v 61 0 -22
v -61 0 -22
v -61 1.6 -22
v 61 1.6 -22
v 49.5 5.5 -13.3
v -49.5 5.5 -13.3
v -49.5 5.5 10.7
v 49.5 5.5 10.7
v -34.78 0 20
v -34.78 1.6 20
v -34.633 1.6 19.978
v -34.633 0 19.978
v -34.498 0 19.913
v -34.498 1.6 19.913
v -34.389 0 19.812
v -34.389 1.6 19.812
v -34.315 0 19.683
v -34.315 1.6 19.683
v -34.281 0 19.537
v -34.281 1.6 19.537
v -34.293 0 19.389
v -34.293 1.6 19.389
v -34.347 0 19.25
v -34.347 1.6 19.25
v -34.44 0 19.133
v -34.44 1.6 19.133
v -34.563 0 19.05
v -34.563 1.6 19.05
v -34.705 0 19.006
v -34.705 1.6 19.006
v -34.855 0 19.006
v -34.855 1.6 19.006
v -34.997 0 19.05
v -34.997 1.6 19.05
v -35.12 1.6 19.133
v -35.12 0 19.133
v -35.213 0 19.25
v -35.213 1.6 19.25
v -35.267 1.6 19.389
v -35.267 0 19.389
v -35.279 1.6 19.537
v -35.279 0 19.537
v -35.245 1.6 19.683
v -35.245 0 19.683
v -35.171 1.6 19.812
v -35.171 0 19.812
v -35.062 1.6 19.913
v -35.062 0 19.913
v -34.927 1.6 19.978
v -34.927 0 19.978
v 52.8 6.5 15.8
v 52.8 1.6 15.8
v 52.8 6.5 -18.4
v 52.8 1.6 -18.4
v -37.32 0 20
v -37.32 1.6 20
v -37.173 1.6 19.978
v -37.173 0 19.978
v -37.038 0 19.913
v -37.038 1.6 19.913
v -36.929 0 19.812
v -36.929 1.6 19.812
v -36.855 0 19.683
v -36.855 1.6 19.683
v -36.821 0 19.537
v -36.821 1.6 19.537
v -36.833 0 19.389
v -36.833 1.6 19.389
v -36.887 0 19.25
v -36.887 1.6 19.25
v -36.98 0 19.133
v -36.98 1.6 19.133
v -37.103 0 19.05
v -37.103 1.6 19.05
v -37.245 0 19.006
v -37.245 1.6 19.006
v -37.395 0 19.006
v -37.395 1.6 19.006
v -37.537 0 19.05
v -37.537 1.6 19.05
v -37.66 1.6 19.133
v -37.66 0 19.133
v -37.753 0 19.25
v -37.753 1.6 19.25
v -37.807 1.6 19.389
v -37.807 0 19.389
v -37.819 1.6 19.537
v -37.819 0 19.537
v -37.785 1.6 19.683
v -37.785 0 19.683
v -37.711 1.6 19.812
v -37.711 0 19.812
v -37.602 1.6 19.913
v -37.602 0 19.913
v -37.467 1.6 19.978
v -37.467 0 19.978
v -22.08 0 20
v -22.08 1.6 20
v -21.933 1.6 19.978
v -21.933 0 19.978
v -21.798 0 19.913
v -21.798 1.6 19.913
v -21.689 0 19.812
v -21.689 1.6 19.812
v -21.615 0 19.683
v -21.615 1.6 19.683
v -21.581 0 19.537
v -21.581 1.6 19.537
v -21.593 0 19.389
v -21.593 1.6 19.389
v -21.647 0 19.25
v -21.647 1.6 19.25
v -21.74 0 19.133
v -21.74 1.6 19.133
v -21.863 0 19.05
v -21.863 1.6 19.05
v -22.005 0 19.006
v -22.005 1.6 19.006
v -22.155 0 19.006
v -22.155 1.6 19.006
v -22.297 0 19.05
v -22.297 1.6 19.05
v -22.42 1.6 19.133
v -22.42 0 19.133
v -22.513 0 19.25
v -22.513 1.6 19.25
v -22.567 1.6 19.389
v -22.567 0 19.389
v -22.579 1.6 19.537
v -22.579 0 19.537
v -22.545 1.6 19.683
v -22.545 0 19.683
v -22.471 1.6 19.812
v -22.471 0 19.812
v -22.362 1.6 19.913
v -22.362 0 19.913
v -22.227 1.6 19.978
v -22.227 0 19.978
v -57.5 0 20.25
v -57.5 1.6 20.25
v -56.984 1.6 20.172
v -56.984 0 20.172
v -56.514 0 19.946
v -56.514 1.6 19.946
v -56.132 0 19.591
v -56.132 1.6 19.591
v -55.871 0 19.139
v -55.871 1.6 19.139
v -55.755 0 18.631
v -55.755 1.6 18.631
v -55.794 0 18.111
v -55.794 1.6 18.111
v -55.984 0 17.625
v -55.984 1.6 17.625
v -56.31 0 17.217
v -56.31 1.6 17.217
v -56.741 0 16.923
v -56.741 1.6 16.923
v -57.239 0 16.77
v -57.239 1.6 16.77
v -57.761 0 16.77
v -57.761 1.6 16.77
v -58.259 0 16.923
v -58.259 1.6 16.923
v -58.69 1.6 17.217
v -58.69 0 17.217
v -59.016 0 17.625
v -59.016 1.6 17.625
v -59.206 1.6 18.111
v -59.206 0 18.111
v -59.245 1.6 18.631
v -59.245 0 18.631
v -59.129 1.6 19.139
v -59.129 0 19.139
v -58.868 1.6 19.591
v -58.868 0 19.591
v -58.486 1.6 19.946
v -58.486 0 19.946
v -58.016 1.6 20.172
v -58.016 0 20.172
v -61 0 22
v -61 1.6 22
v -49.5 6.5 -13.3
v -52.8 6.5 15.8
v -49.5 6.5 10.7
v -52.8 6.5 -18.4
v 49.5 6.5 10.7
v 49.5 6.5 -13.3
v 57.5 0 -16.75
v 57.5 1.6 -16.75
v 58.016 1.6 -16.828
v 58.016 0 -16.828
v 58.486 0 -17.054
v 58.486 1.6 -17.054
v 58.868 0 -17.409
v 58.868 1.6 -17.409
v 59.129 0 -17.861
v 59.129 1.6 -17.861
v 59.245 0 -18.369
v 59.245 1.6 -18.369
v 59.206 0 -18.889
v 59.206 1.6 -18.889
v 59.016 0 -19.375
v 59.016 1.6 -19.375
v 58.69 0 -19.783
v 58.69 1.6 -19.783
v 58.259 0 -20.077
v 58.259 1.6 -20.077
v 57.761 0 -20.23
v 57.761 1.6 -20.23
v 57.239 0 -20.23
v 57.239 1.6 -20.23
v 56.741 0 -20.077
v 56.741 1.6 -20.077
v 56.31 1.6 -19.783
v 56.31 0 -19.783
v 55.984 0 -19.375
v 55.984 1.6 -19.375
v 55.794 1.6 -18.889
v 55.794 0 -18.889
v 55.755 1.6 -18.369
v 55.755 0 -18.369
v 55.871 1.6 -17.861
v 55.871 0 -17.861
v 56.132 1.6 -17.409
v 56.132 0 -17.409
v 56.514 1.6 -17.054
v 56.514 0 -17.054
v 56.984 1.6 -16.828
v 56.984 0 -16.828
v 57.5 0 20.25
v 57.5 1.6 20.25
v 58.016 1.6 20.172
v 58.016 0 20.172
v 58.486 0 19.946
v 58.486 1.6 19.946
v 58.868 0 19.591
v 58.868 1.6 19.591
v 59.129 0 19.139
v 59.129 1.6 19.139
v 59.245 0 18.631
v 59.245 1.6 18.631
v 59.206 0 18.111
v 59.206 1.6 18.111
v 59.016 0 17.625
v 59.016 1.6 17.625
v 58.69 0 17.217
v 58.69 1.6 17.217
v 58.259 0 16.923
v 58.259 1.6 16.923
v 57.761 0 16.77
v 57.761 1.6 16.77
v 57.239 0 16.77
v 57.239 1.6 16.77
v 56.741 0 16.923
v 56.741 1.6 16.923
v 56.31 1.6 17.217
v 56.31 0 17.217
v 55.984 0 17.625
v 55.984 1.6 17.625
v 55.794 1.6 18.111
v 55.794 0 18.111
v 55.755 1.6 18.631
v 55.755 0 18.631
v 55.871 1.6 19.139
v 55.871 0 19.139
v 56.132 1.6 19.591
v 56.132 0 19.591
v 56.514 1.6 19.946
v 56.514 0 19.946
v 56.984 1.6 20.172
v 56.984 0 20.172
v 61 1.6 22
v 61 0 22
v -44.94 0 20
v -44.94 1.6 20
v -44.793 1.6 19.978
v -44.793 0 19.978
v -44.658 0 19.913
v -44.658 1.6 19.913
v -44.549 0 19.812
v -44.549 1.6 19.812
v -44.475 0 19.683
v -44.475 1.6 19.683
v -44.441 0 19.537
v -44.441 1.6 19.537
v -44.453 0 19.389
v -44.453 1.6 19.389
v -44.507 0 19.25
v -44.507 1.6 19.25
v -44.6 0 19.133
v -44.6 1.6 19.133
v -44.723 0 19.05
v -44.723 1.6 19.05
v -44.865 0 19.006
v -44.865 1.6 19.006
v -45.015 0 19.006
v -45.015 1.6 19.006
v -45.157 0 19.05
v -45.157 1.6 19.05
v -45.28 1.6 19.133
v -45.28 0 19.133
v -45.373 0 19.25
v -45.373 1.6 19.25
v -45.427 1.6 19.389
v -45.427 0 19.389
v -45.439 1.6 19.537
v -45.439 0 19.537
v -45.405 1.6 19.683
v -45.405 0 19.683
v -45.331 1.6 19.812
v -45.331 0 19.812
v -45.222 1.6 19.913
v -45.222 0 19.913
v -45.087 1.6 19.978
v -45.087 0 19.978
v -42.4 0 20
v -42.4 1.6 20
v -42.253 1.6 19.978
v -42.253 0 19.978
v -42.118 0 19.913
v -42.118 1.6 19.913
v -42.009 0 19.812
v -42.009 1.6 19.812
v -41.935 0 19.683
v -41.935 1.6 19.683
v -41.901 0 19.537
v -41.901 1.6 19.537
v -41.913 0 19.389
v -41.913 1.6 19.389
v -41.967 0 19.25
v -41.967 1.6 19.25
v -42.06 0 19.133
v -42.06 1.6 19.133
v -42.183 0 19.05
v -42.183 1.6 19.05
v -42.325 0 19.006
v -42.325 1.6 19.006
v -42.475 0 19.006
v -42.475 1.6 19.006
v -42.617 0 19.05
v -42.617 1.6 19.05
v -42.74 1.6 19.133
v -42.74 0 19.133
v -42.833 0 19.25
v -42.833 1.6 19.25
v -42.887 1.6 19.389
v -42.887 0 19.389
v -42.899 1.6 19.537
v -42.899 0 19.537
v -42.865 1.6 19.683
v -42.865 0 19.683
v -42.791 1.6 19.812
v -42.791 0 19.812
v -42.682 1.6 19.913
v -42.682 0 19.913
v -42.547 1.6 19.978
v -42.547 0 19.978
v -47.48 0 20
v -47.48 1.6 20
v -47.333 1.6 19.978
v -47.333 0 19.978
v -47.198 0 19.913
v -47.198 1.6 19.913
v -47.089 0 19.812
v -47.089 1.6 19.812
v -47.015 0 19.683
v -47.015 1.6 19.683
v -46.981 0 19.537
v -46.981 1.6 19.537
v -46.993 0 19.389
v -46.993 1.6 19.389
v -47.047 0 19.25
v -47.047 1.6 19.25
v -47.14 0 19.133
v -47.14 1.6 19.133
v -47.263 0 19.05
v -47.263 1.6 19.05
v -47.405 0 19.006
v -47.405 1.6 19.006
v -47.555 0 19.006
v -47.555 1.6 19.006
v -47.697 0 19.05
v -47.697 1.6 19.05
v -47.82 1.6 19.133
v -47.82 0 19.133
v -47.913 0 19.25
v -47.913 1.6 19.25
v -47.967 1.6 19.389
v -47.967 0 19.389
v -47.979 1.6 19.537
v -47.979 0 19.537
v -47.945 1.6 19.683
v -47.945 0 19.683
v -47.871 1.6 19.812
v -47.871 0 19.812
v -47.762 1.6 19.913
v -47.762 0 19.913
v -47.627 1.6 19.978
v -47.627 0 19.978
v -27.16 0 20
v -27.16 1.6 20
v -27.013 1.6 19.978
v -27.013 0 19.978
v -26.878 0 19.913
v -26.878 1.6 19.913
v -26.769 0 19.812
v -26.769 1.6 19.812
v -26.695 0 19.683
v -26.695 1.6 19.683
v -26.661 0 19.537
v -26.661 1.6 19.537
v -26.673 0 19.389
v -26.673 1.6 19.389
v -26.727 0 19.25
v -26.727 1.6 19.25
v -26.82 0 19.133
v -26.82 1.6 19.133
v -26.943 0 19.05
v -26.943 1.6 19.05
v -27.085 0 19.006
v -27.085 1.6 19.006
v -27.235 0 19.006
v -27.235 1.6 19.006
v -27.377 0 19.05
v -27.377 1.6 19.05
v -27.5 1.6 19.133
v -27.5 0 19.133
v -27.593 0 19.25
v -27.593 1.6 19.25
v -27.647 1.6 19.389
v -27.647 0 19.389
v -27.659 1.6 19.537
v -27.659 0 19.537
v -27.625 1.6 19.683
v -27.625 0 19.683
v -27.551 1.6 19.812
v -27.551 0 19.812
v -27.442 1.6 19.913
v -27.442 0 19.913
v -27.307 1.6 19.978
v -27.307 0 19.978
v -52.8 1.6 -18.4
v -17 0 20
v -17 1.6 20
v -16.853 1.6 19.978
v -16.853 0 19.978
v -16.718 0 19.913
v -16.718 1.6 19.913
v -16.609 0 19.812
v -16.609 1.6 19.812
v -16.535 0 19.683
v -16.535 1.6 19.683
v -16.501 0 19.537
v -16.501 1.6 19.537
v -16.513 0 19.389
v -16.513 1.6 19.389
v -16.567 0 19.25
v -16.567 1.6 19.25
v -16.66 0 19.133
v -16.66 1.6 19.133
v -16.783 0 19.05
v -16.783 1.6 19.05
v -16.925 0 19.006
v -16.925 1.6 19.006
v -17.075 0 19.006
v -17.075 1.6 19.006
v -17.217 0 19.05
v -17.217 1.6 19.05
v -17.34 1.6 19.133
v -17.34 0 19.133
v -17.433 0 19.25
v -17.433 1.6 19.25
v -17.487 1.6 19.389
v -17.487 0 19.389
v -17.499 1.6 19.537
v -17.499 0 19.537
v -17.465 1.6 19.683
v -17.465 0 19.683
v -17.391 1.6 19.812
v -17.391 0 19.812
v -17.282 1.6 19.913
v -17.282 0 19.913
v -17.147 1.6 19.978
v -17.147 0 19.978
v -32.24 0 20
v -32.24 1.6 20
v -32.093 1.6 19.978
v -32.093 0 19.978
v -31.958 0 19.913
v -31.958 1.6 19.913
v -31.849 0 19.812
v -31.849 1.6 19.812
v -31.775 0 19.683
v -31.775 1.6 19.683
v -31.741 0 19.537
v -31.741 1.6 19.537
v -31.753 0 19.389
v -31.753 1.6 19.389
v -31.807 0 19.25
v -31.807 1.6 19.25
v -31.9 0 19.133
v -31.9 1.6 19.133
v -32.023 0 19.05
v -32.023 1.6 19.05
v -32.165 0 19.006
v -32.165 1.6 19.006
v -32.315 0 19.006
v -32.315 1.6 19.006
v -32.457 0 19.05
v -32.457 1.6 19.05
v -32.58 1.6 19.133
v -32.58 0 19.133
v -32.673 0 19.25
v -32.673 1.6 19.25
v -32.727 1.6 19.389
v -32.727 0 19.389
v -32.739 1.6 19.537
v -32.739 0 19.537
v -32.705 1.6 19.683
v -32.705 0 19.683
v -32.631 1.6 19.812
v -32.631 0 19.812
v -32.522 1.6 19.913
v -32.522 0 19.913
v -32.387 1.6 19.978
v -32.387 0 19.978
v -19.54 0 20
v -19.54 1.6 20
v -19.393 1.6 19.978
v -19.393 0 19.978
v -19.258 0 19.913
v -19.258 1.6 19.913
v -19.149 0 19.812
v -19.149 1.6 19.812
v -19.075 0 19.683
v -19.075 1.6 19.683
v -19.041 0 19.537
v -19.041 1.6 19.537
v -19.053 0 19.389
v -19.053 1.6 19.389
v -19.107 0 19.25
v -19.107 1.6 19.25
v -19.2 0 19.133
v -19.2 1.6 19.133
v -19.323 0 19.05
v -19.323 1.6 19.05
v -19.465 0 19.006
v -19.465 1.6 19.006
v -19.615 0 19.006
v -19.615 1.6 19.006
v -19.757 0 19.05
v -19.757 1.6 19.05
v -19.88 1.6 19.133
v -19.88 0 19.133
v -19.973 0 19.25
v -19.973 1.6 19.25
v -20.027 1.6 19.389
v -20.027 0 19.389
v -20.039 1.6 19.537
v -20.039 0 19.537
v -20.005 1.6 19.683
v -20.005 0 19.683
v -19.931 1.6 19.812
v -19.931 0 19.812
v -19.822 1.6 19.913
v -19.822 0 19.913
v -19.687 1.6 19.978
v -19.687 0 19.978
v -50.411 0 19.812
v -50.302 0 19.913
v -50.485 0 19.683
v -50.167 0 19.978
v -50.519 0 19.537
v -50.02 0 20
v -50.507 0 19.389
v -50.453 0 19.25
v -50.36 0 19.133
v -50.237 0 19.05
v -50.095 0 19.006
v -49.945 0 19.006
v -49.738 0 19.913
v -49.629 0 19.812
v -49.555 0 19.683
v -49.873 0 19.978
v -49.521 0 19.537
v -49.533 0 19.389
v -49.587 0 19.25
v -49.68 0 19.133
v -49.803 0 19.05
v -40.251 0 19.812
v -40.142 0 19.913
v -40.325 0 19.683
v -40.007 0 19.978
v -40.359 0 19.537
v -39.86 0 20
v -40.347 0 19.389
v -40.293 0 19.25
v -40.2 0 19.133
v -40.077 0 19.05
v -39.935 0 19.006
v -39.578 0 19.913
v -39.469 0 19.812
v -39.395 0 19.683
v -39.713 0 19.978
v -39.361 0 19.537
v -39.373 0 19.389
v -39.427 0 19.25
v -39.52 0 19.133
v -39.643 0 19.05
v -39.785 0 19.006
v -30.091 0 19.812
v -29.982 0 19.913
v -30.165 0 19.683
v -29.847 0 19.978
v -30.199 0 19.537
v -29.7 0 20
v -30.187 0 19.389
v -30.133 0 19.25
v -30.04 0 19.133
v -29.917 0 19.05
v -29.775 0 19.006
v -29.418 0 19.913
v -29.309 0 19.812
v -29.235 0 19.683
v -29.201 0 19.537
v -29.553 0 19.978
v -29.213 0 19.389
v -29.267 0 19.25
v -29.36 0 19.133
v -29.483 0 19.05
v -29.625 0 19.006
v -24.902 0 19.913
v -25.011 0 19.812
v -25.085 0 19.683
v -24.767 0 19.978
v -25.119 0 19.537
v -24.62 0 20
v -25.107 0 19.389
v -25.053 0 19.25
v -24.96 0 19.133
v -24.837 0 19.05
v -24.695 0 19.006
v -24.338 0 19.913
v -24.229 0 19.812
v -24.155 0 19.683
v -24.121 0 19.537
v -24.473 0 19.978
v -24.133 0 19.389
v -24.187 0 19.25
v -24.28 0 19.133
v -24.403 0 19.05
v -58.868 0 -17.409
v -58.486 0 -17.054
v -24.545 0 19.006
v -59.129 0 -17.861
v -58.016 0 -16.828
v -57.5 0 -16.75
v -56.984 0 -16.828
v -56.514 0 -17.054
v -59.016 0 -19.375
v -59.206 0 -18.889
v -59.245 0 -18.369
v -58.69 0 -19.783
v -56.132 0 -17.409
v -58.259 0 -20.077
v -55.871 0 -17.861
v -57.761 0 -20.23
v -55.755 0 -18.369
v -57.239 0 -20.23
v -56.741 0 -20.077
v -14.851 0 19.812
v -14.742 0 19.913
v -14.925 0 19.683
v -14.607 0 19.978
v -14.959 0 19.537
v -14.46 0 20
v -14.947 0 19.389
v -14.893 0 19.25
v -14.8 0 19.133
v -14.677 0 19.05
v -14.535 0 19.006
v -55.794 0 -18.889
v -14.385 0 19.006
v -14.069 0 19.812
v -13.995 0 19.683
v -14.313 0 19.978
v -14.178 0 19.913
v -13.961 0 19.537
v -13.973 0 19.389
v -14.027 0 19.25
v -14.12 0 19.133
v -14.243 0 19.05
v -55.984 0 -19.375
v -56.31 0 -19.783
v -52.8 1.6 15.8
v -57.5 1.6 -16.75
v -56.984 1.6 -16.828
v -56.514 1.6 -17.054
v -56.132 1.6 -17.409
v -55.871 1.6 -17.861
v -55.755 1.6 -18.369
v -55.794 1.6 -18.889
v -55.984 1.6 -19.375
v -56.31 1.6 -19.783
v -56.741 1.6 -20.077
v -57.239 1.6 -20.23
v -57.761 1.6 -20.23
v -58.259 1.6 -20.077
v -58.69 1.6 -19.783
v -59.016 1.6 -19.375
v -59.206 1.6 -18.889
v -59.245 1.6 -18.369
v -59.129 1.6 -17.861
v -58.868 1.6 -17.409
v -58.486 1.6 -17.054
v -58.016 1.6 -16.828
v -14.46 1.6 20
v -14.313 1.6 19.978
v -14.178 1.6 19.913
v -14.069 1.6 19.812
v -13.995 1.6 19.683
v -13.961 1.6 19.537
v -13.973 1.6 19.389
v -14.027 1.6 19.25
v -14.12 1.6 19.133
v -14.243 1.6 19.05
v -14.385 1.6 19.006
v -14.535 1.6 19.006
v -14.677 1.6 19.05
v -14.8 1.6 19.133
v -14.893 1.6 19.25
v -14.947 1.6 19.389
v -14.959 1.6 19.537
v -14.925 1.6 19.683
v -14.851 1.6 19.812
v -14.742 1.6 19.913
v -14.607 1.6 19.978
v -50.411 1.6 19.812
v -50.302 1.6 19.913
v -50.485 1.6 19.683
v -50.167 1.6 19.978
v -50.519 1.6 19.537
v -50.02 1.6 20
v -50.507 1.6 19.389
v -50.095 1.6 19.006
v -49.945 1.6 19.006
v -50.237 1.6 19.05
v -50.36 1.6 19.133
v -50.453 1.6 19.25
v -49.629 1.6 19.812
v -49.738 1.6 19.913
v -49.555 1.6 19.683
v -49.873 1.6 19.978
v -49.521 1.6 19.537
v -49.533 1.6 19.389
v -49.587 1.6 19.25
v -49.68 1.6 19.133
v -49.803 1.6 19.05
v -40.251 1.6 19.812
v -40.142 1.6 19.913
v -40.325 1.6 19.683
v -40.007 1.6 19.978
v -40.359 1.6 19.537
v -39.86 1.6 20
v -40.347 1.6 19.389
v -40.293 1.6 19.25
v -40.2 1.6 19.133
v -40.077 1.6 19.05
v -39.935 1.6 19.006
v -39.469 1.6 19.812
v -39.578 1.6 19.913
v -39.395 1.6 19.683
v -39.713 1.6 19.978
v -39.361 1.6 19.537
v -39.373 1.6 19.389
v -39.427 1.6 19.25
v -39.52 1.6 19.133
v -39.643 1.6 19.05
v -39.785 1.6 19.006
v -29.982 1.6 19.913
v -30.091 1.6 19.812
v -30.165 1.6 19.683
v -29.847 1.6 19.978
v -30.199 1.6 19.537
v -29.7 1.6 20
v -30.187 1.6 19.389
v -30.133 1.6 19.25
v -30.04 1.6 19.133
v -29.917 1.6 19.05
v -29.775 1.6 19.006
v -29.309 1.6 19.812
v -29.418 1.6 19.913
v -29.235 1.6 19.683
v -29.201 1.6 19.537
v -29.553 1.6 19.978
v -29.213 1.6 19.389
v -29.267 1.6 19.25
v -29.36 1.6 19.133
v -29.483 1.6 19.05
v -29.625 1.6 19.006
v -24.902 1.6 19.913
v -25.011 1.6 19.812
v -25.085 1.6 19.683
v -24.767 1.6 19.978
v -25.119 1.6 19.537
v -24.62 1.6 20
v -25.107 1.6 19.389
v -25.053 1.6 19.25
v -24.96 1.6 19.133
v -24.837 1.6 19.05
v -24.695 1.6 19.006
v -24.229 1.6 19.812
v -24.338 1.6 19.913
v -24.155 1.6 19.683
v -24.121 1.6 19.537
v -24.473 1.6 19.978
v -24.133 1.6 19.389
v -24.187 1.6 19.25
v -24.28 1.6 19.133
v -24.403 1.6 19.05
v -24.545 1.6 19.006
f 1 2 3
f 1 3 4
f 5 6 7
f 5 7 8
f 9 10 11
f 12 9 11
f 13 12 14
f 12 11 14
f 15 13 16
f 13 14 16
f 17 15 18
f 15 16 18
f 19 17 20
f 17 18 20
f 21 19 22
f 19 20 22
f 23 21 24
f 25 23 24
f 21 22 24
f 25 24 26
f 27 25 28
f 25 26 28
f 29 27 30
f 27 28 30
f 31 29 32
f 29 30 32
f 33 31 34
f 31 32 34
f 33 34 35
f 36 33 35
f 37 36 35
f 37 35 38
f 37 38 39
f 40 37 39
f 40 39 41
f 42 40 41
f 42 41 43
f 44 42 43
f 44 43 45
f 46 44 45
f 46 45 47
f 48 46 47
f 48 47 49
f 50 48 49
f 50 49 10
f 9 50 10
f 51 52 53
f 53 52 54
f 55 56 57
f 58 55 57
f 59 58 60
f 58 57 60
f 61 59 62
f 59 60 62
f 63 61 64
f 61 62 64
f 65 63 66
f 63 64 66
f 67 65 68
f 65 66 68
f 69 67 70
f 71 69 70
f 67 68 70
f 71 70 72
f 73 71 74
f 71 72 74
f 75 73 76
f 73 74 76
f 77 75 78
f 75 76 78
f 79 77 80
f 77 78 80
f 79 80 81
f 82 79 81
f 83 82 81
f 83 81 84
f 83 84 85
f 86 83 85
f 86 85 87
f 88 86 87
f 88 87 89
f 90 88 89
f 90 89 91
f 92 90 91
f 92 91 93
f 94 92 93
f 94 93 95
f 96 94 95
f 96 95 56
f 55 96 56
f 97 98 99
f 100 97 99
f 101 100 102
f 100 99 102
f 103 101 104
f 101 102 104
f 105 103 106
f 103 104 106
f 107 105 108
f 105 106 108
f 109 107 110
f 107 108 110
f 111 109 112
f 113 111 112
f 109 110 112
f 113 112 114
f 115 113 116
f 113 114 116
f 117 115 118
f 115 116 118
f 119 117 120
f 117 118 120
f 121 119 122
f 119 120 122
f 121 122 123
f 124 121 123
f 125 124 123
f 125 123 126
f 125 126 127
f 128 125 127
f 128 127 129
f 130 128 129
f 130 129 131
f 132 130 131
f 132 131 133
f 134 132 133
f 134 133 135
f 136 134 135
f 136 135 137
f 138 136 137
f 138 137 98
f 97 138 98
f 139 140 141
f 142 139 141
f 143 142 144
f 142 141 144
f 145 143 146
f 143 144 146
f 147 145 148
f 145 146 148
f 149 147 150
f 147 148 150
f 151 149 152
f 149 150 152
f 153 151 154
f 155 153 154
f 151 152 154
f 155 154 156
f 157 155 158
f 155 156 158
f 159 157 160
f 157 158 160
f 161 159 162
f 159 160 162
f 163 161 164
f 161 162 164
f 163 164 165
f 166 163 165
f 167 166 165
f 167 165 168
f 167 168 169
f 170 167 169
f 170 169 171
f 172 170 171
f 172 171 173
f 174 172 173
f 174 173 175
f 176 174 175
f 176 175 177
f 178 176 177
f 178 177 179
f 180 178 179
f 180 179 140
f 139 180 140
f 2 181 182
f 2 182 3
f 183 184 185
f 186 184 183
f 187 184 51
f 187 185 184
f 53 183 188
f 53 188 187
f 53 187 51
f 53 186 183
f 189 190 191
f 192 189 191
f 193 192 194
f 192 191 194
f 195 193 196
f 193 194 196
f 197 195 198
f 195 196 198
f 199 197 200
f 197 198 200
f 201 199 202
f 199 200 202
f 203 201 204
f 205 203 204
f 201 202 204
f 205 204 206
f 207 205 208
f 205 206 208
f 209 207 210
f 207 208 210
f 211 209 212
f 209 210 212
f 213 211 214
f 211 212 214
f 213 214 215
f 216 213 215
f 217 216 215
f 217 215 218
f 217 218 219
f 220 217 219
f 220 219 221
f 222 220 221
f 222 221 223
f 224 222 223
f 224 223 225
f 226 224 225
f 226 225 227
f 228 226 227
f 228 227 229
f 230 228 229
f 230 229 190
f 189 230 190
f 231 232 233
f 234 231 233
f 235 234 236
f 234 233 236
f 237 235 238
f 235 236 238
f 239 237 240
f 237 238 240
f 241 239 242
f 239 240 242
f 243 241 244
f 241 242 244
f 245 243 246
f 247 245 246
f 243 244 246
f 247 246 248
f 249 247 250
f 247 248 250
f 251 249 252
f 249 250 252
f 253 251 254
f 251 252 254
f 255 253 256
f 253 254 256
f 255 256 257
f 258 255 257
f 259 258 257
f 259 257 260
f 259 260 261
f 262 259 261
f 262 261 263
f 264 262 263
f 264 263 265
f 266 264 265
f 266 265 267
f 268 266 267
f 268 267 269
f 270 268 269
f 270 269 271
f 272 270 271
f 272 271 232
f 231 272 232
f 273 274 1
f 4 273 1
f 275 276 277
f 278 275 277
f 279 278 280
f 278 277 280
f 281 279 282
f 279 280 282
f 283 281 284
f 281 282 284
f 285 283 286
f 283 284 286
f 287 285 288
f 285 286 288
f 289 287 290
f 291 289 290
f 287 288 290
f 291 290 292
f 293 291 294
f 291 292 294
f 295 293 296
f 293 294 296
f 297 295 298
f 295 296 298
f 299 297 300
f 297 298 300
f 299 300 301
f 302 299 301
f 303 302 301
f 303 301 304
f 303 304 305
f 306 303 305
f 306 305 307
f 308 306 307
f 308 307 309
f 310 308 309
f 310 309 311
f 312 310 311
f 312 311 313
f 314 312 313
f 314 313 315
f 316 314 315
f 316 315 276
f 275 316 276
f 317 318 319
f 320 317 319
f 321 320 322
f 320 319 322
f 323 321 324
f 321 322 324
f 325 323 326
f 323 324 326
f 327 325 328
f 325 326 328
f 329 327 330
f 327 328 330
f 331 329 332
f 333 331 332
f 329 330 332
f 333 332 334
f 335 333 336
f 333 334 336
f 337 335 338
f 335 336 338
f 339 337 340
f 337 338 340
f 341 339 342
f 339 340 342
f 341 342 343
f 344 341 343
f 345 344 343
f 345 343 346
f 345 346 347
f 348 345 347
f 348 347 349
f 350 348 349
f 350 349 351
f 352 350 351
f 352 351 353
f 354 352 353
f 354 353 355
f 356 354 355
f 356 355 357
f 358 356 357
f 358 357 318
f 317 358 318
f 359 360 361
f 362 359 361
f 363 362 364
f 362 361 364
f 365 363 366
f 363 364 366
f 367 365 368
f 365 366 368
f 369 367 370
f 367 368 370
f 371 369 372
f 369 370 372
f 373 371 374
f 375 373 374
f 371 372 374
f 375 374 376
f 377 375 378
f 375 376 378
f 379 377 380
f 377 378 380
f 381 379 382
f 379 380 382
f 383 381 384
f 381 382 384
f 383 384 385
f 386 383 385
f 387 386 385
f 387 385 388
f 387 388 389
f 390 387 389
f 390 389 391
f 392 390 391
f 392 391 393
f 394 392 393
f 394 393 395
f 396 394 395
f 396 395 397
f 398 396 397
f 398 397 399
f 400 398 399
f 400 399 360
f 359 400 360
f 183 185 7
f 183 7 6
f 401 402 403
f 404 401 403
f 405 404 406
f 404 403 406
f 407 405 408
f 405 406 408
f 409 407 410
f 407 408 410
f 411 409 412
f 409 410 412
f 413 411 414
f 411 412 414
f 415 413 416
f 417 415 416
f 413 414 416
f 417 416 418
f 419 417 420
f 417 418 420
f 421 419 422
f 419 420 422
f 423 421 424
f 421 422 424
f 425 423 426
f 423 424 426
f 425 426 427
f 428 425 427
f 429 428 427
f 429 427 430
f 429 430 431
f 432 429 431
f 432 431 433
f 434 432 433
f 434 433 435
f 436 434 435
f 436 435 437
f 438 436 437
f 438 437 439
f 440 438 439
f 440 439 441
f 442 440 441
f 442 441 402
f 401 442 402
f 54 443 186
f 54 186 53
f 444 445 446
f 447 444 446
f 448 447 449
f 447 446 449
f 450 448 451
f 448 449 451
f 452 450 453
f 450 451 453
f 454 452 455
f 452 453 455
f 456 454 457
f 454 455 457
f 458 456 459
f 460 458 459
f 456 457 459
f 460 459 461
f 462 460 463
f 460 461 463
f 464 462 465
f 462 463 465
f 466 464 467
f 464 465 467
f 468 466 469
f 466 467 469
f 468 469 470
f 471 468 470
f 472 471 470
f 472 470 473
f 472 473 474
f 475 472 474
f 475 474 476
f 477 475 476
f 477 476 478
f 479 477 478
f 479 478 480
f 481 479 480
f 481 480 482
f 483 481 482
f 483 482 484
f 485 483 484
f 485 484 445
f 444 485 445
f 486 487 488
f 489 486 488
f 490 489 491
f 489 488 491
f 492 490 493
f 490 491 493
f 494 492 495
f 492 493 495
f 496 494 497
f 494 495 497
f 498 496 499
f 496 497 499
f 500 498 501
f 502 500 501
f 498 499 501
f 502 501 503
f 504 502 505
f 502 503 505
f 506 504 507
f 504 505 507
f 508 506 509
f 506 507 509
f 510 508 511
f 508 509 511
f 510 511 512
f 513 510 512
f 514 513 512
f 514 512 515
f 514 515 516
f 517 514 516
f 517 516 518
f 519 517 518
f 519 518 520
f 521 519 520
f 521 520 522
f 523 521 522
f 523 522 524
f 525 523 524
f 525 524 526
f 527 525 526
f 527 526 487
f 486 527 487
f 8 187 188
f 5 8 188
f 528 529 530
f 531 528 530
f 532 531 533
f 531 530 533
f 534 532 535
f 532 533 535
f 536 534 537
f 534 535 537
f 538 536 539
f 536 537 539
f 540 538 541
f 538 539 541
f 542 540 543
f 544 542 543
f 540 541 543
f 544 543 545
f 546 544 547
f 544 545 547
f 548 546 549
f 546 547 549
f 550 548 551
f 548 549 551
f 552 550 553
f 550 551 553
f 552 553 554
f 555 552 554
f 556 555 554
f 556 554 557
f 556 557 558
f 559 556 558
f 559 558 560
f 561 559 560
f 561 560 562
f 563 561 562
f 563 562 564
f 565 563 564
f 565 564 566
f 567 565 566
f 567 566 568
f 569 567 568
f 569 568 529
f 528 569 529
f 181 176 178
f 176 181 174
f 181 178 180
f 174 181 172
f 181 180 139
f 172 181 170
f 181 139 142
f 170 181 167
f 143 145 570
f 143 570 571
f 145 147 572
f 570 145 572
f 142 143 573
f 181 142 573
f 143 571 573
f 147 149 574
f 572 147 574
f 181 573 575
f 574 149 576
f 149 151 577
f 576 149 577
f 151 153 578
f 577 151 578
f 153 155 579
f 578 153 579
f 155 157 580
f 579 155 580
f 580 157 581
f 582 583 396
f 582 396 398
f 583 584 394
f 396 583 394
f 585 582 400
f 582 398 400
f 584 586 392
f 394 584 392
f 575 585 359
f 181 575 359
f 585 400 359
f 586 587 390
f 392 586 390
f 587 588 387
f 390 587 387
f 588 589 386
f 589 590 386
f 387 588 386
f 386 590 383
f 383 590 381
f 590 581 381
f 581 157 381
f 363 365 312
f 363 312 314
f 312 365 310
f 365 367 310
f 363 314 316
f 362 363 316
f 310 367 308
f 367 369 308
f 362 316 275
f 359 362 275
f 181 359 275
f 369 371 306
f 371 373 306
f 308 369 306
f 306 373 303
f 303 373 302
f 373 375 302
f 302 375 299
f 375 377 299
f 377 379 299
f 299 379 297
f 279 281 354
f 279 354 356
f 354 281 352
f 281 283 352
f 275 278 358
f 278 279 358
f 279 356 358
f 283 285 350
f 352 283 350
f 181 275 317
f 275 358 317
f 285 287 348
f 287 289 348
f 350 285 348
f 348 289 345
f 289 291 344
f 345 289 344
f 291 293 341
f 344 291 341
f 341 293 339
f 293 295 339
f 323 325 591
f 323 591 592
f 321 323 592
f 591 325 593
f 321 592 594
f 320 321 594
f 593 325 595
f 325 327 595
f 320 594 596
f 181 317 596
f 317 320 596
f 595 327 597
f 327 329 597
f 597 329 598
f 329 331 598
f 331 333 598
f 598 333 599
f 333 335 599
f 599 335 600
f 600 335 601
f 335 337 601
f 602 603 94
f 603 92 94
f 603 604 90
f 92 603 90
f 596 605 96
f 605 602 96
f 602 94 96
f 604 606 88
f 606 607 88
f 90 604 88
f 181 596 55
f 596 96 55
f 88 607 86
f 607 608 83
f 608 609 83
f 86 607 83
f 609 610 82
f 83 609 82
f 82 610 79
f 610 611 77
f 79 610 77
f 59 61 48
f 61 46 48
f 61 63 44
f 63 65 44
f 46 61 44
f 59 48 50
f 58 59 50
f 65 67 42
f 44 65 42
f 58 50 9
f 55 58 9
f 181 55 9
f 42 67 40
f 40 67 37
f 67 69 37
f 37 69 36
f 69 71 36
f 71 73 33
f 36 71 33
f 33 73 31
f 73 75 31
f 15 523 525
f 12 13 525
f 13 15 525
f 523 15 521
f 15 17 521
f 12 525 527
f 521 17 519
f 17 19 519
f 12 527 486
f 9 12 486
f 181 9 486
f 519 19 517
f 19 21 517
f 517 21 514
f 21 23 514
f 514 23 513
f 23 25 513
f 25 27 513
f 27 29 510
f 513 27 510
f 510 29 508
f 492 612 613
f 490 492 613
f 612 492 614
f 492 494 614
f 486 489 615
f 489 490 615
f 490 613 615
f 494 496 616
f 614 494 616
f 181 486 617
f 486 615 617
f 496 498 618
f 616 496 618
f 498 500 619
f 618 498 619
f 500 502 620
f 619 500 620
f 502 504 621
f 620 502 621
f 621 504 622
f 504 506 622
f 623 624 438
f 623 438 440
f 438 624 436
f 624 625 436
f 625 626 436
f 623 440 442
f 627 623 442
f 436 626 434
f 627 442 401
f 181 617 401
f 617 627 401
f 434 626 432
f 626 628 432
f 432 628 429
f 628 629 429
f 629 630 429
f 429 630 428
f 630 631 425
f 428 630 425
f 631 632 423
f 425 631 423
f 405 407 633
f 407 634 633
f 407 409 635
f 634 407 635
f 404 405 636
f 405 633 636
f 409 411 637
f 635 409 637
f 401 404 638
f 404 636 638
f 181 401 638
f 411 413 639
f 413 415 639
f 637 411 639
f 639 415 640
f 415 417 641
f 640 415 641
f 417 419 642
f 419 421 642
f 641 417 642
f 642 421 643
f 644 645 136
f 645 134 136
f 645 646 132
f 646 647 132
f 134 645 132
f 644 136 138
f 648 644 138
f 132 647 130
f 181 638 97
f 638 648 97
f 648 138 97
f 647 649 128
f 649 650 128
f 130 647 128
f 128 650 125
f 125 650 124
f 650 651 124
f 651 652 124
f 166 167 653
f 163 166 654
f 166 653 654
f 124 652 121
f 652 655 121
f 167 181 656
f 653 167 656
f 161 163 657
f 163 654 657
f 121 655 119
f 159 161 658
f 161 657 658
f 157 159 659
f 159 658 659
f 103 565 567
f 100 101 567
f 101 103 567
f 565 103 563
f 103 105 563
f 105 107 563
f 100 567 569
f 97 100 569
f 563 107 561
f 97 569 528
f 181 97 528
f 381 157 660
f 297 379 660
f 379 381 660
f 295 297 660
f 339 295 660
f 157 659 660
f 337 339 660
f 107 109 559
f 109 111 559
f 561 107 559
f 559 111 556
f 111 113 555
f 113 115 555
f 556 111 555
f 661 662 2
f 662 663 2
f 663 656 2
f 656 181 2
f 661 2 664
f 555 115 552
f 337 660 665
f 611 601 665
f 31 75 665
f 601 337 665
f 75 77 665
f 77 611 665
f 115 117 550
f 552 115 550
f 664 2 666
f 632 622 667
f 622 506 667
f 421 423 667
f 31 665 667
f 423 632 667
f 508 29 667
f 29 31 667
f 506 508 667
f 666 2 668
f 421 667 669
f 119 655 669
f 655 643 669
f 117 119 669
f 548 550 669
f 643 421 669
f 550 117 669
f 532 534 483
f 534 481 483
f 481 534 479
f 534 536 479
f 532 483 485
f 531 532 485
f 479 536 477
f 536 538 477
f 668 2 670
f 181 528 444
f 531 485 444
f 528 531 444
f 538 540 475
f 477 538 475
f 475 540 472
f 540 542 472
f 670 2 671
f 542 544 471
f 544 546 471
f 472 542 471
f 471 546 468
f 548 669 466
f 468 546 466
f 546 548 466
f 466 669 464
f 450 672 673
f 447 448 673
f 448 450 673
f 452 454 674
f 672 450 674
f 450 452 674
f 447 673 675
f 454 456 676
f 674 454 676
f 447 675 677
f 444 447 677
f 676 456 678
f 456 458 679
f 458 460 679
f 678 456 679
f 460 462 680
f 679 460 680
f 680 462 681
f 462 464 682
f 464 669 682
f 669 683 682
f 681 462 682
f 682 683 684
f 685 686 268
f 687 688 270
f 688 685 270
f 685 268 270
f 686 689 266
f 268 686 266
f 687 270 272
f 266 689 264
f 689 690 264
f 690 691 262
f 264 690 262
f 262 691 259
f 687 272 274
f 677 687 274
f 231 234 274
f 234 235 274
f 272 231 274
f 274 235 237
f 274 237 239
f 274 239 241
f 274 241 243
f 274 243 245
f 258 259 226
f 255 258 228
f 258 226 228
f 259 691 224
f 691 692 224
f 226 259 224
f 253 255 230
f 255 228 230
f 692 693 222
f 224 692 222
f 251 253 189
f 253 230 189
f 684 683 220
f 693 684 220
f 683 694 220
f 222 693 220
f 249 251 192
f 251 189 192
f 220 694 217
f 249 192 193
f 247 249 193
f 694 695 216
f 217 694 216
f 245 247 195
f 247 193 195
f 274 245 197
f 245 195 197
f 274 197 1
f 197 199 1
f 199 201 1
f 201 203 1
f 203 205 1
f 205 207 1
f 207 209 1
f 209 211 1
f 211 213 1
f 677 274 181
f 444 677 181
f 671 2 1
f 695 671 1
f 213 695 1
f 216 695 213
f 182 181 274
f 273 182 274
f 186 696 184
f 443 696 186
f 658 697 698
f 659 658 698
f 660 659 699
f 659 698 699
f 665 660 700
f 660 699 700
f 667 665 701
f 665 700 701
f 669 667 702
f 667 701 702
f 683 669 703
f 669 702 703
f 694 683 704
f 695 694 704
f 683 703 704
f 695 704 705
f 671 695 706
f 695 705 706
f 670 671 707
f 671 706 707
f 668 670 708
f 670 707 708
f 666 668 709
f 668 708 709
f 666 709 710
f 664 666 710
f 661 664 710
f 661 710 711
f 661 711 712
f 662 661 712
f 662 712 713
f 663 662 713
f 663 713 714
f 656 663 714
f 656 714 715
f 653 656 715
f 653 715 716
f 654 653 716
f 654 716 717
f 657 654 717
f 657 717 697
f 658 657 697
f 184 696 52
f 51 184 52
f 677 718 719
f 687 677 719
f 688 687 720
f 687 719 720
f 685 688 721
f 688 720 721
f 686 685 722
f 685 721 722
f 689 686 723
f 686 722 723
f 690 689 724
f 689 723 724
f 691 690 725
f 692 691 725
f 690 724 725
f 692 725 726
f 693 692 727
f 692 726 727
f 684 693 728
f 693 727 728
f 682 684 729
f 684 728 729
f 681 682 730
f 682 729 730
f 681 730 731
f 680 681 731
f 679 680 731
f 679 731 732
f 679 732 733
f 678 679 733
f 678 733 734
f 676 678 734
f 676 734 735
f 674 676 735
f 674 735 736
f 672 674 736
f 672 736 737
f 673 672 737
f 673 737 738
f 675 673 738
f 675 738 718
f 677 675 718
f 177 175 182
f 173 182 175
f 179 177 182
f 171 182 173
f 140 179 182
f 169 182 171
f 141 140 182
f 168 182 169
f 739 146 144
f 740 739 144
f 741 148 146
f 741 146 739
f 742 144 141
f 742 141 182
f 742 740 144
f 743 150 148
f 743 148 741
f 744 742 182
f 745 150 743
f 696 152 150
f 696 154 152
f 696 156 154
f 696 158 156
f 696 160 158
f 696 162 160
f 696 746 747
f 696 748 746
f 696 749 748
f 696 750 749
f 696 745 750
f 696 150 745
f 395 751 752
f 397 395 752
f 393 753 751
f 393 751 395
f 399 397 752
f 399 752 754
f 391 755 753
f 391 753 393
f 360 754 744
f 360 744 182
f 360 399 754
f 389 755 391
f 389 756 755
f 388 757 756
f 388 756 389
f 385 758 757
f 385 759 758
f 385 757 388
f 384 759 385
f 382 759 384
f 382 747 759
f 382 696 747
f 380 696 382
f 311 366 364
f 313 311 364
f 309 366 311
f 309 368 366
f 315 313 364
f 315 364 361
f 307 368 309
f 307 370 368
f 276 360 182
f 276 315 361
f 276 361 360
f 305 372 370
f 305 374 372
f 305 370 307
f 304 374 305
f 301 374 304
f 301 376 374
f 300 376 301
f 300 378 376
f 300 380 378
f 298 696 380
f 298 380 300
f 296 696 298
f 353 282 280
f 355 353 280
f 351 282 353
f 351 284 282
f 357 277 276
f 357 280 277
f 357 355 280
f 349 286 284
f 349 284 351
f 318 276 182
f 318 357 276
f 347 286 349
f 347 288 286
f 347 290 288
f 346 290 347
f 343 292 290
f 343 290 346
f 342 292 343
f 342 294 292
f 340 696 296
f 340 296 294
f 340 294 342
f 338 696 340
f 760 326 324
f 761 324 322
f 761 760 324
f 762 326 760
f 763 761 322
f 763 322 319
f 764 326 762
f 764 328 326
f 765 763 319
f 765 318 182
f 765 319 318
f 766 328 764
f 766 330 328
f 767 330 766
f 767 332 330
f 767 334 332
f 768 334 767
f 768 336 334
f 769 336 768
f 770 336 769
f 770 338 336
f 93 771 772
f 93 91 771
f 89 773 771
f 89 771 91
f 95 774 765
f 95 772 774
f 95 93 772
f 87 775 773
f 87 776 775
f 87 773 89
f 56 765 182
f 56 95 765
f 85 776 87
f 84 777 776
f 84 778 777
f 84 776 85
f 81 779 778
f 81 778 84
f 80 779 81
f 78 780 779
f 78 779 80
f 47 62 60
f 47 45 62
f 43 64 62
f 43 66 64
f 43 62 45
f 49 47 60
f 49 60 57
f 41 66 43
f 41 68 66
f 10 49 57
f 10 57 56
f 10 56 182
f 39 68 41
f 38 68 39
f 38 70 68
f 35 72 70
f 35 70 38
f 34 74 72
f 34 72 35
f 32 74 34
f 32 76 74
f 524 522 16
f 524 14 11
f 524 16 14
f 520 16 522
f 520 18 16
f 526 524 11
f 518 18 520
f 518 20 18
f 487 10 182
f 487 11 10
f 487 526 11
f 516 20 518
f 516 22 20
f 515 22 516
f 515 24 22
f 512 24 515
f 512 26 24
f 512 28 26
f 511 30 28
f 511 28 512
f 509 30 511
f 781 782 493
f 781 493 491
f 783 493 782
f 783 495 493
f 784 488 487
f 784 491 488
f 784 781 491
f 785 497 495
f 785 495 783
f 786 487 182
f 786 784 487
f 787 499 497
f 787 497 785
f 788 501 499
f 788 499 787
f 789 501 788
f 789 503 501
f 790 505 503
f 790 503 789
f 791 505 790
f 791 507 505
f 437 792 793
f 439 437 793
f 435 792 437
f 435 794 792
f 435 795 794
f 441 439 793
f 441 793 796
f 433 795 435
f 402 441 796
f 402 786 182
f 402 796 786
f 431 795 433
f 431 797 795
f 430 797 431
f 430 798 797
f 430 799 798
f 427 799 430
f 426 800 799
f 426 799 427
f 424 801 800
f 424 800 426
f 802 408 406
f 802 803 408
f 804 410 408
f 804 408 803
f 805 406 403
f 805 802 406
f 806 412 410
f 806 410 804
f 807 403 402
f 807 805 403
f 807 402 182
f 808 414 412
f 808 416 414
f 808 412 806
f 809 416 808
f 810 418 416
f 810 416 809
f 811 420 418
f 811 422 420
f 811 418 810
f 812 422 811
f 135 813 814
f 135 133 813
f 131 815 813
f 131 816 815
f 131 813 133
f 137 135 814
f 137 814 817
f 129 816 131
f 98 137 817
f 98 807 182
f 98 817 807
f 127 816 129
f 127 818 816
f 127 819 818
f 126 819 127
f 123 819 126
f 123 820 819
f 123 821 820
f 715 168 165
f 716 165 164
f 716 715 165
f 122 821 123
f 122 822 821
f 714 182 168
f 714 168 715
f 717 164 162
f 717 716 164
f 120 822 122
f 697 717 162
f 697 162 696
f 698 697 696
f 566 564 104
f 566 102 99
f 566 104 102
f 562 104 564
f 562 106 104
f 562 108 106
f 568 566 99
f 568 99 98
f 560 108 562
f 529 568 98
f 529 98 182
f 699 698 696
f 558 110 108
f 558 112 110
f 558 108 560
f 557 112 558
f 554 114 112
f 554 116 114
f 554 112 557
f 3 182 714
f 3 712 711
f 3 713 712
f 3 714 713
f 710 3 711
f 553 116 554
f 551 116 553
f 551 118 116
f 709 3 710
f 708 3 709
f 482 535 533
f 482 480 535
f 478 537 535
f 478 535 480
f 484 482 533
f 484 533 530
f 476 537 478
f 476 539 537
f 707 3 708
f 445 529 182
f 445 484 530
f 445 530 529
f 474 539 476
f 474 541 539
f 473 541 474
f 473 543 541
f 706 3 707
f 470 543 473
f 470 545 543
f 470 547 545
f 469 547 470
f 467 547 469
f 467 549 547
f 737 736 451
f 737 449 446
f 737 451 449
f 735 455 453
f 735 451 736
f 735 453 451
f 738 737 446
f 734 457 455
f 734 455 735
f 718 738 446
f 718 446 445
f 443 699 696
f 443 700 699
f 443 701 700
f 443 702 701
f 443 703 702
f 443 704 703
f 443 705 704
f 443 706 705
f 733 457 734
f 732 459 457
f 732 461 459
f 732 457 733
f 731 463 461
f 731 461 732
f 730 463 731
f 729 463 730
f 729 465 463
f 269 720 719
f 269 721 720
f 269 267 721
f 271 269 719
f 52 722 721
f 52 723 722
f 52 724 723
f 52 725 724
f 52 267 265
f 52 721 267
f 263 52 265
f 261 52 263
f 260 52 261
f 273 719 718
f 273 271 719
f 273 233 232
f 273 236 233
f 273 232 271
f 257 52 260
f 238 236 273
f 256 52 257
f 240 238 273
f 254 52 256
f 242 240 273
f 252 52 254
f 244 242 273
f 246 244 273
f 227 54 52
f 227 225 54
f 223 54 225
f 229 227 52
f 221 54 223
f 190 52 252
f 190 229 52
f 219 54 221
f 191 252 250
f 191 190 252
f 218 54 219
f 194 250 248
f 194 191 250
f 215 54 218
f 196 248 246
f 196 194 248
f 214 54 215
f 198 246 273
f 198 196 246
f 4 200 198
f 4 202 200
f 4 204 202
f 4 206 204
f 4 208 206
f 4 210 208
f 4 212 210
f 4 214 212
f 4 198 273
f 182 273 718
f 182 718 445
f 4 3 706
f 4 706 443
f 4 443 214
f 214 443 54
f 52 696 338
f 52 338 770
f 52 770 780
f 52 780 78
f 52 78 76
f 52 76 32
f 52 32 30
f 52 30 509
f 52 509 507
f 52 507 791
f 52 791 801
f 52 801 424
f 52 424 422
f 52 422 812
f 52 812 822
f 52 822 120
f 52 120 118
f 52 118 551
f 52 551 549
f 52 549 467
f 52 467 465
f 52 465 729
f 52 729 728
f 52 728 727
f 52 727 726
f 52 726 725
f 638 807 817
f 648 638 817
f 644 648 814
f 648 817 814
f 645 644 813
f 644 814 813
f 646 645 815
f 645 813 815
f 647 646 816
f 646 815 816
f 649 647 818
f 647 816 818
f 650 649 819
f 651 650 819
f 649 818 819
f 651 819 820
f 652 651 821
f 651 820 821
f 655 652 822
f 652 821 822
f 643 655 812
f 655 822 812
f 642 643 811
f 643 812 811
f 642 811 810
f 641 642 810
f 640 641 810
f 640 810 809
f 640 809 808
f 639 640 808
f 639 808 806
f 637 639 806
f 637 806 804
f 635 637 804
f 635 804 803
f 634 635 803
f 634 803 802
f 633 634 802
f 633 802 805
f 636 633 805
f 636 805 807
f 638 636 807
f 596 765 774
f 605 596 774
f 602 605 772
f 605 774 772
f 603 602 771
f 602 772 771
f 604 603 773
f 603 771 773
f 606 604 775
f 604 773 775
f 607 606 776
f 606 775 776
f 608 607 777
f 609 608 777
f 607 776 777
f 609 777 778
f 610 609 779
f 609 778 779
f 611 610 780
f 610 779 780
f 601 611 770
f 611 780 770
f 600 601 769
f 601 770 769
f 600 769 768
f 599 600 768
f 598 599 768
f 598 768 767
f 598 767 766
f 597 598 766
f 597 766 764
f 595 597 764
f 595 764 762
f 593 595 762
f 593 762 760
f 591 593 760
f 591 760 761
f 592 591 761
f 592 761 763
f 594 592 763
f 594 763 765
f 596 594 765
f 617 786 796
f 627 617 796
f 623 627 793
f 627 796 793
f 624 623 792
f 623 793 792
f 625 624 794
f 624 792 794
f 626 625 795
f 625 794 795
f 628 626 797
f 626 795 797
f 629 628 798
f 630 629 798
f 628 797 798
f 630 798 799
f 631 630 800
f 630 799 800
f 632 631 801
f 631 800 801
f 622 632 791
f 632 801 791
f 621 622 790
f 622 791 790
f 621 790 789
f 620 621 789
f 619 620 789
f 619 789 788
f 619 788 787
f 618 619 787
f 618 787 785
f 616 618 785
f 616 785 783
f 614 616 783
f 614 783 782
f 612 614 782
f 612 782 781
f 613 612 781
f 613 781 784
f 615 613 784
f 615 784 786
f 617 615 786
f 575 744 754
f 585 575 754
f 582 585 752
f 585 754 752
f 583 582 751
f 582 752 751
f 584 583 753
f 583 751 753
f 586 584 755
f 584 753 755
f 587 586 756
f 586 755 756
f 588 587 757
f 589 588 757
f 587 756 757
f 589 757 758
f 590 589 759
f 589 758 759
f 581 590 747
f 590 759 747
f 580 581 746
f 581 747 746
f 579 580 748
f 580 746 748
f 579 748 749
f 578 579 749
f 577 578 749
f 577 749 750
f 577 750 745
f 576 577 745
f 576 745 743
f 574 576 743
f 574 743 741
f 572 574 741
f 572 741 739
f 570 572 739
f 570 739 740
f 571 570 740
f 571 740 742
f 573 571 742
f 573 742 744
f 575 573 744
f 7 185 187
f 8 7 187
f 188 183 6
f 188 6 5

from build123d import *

# Parameters (mm, degrees)
SKETCH1_W           = 122
SKETCH1_H           = 44
BOSS_EXTRUDE1_DEPTH = 1.6
SKETCH2_W           = 105.6
SKETCH2_H           = 34.2
BOSS_EXTRUDE2_DEPTH = 4.9
SKETCH3_R           = 1.75
CUT_EXTRUDE1_DEPTH  = 66.030838838
SKETCH5_W           = 99
SKETCH5_H           = 24
CUT_EXTRUDE2_DEPTH  = 1
SKETCH4_R           = 0.5
CUT_EXTRUDE3_DEPTH  = 66.030838838
LPATTERN1_COUNT     = 15
LPATTERN1_PITCH     = 2.54


with BuildPart() as part:
    # Sketch1 → Boss-Extrude1 (new body)
    with BuildSketch(Plane(origin=(0, 0, 0), x_dir=(1, 0, 0), z_dir=(0, 1, 0))):
        Rectangle(SKETCH1_W, SKETCH1_H)
    extrude(amount=BOSS_EXTRUDE1_DEPTH)

    # Sketch2 → Boss-Extrude2 (add)
    with BuildSketch(Plane(origin=(0, 1.6, 0), x_dir=(1, 0, 0), z_dir=(0, 1, 0))):
        with Locations((0, 1.3)):
            Rectangle(SKETCH2_W, SKETCH2_H)
    extrude(amount=BOSS_EXTRUDE2_DEPTH)

    # Sketch3 → Cut-Extrude1 (cut, through all)
    with BuildSketch(Plane(origin=(0, 1.6, 0), x_dir=(1, 0, 0), z_dir=(0, 1, 0))):
        with Locations((-57.5, 18.5)):
            Circle(SKETCH3_R)
        with Locations((-57.5, -18.5)):
            Circle(SKETCH3_R)
        with Locations((57.5, 18.5)):
            Circle(SKETCH3_R)
        with Locations((57.5, -18.5)):
            Circle(SKETCH3_R)
    extrude(amount=-CUT_EXTRUDE1_DEPTH, mode=Mode.SUBTRACT)

    # Sketch5 → Cut-Extrude2 (cut)
    with BuildSketch(Plane(origin=(0, 6.5, 0), x_dir=(1, 0, 0), z_dir=(0, 1, 0))):
        with Locations((0, 1.3)):
            Rectangle(SKETCH5_W, SKETCH5_H)
    extrude(amount=-CUT_EXTRUDE2_DEPTH, mode=Mode.SUBTRACT)

    # Sketch4 → Cut-Extrude3 (cut, through all)
    with BuildSketch(Plane(origin=(0, 1.6, 0), x_dir=(1, 0, 0), z_dir=(0, 1, 0))):
        with Locations((-50.02, -19.5)):
            Circle(SKETCH4_R)
    cut_extrude3 = extrude(amount=-CUT_EXTRUDE3_DEPTH, mode=Mode.SUBTRACT)

    # LPattern1: Cut-Extrude3 ×15
    with Locations(*[(i * LPATTERN1_PITCH, 0, 0) for i in range(1, LPATTERN1_COUNT)]):
        add(cut_extrude3, mode=Mode.SUBTRACT)


solid = part.part
